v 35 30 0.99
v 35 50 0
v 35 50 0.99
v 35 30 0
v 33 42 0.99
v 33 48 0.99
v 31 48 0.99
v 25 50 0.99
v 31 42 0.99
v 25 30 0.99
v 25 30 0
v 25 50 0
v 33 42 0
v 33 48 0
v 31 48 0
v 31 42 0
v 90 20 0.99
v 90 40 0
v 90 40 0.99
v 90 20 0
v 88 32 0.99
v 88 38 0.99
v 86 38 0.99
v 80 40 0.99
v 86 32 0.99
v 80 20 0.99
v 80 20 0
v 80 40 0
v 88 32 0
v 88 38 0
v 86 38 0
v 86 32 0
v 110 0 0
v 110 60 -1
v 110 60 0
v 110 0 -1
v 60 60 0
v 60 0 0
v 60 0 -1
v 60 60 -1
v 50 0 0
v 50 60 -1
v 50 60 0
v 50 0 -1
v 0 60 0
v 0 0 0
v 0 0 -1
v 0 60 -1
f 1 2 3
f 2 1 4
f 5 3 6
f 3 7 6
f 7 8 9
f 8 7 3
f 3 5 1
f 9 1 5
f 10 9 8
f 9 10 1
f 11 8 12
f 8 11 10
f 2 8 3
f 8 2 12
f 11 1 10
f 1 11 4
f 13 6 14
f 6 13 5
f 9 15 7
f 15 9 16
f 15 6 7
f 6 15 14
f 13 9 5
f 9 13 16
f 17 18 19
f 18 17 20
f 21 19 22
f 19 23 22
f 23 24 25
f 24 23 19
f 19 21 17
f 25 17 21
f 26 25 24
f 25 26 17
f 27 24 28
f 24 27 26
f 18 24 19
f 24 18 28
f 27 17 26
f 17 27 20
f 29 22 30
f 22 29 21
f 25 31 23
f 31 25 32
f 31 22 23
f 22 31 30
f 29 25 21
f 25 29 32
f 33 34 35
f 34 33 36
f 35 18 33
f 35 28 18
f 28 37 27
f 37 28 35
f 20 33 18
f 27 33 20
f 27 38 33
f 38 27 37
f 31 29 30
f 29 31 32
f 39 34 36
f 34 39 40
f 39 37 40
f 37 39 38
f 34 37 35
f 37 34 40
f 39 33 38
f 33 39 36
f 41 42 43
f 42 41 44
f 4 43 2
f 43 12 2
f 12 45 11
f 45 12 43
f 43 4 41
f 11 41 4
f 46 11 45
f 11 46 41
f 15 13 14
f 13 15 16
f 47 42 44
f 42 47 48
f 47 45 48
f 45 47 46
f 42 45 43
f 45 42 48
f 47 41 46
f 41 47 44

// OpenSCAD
// file: ../../Base/PlacementOptions.scad
// Fischertechnik Box Foundation
// Placement Options

// Alignment
NoAlign = 0;
AlignLeft = 1;
AlignBottom = 2;
AlignCenter = 3;
AlignRight = 4;
AlignTop = 5;

// Element rotation degree steps
rotations = [0, -90, -180, -270];

// Rotation
NoRotation = 0;
Rotate0 = 0;
Rotate90 = 1;
Rotate180 = 2;
Rotate270 = 3;

// Docking (seen from above)
NoDock = -1;
DockLeft = 0;
DockTop = 1;
DockRight = 2;
DockCorner = 2;
DockBottom = 3;

// Web corners
LowerLeft = 0;
UpperLeft = 1;
UpperRight = 2;
LowerRight = 3;

// Web position relative to corner
LeftOfCorner = 0;
RightOfCorner = 1;
// file: ../../Base/Boxes.scad
// Fischertechnik Box Foundation
// Pre-designed Boxes

use <Constants.scad>

include <PlacementOptions.scad>

box190Width = 190;
box190Depth = 130;
box130Width = 130;
box130Depth = 95;
boxUsageHeight = 33.9;
boxWallThickness = 2.4;
boxBaseThickness = 1.0;

// getBoxWallThickness()
// Gets the wall thickness of a Fischertechnik Box

function getBoxWallThickness() = boxWallThickness;

// Gets the usable height of a fischertechnik box
function getBoxUsageHeight() = boxUsageHeight;

// Gets the thickness of the Fischertechnik box base.
function getBoxBaseThickness() = boxBaseThickness;

// Gets the usable inner space of a Box 190 as an x/y-list
function getBox190Space() = [
    box190Width - 2*getBoxWallThickness(), 
    box190Depth - 2*getBoxWallThickness() ];

// Imports the Fischertechnik empty box 130x190 mm and places it at position 0,0
// 190x130 are the outer sizes, the inner space is slightly smaller. Use getBox190Space() to get the inner sizes.
// This module needs the STL file "Fischertechnik Box 130x190.stl" in the library path.
// The box is positioned that the usable inner space is at the 0,0,0 position. The

module Box190() {
    translate([-getBoxWallThickness(),-getBoxWallThickness(),-getBoxBaseThickness()])
        import("Fischertechnik Box 130x190.stl", convexity=3);
}

// Gets the usable inner space of a Box 130 as an x/y-list
function getBox130Space() = [
    box130Width - 2*getBoxWallThickness(), 
    box130Depth - 2*getBoxWallThickness() ];

// Imports the Fischertechnik empty box 95x130 mm and places it at position 0,0
// 190x130 are the outer sizes, the inner space is slightly smaller. Use getBox190Space() to get the inner sizes.
// This module needs the STL file "Fischertechnik Box 95x130.stl" in the library path.
// The box is positioned that the usable inner space is at the 0,0,0 position. The

module Box130() {
    translate([-getBoxWallThickness(),-getBoxWallThickness(),-getBoxBaseThickness()])
        import("Fischertechnik Box 95x130.stl", convexity=3);
}

// Creates a web at the specified box walls
// corner 0 = LowerLeft, 1 = UpperLeft, 2 = UpperRight, 3 = LowerRight
// side 0 = LeftOfCorner, 1 = RightOfCorner
// distance = Distance in mm from the corner
// box = inner width and depth of the box (default: Box 190)
// webWidth = length of the web (default is 3 mms)
// webThickness = thickness of the web (default is 1 mm)

module BoxWeb(corner, side, distance, box=getBox190Space(), webWidth=3, webThickness=1.0) {
    sink = getBoxWallThickness()/2;

    width = (corner % 2 == 0) ? 
            (side == LeftOfCorner ? webWidth : webThickness) :
            (side == LeftOfCorner ? webThickness : webWidth);

    depth = (corner % 2 == 0) ? 
            (side == RightOfCorner ? webWidth : webThickness) :
            (side == RightOfCorner ? webThickness : webWidth);
    
    xDiff = corner == LowerLeft ? 
                (side == LeftOfCorner ? -sink : distance) :
            (corner == UpperLeft ?                
                (side == LeftOfCorner ? distance : -sink) :
            (corner == UpperRight ?
                (side == LeftOfCorner ? box.x-webWidth+sink : box.x-distance-webThickness) :
                (side == LeftOfCorner ? box.x-distance-webThickness: box.x-webWidth+sink)));

    yDiff = corner == LowerLeft ? 
                (side == RightOfCorner ? -sink : distance) :
            (corner == UpperLeft ?
                (side == RightOfCorner ? box.y-distance : box.y-webWidth+sink) :
            (corner == UpperRight ?
                (side == RightOfCorner ? box.y-webWidth+sink : box.y-distance) :
                (side == RightOfCorner ? distance : -sink)));
    
    translate([xDiff, yDiff, -getExcess()])
        cube([width, depth, boxUsageHeight + 2*getExcess()]);
}
// file: ../../Base/Rotation.scad
// Fischertechnik Box Foundation
// Geometry Helpers Rotation

include <PlacementOptions.scad>

// getRotatedSpace(space, rotation=NoRotation)
// Rotates the space dependent on the specified rotation

function getRotatedSpace(space, rotation=NoRotation) = [
    (rotation == Rotate90 || rotation == Rotate270) ? space.y : space.x,
    (rotation == Rotate90 || rotation == Rotate270) ? space.x : space.y
];

// Rotates the given space around the fixed left lower corner
// space = the space the children needs as width/depth list [width,depth]
// rotation = 0 Rotate0 degrees, 1 Rotate90 degrees, 2 Rotate180 degrees, 3 Rotate270 degrees (equivalent to -90)

module RotateFix(space, rotation=Rotate0) {
    dy = (rotation == Rotate0 || rotation == Rotate270) ? 0 :
        (rotation == Rotate90) ? space.x :
        space.y;
    dx = (rotation < Rotate180) ? 0 :
        (rotation == Rotate180) ? space.x :
        space.y;
    
    translate([dx, dy, 0])
        rotate([0, 0, rotations[rotation]])
            children();
}
// file: ../../Base/Alignment.scad
// Fischertechnik Box Foundation
// Geometry Helpers Alignment

include <PlacementOptions.scad>

// getAlignedX(elementWidth, spaceWidth, align=AlignRight, offset=0)
// Gets the aligned X offset of an element with the given
// width in the given space.
// elementWidth = The width of the element to positon
// spaceWidth = The space where the element should be aligned
// align = 0 AlignLeft, 1 AlignCenter, 2 AlignRight
// offset = an optional offset from the aligned position. When
// aligned left or centered, then positive values are in X direction.
// When aligned right then positive values are in negative X direction.

function getAlignedX(elementWidth, spaceWidth, align=AlignRight, offset=0) =
    (align == AlignLeft) ?
        offset :
        ((align == AlignCenter) ?
        (spaceWidth - elementWidth)/2 + offset :
        spaceWidth - offset - elementWidth);

// getAlignedY(elementDepth, spaceDepth, align=AlignTop, offset=0)
// Gets the aligned Y offset of an element with the given
// depth in the given space.
// elementDepth = The depth of the element to positon
// spaceDepth = The space where the element should be aligned
// align = 0 AlignBottom, 1 AlignCenter, 2 AlignTop
// offset = an optional offset from the aligned position. When
// aligned bottom or centered, then positive values are in Y direction.
// When aligned top then positive values are in negative Y direction.

function getAlignedY(elementDepth, spaceDepth, align=AlignTop, offset=0) =
    (align == AlignBottom) ?
        offset :
        ((align == AlignCenter) ?
        (spaceDepth - elementDepth)/2 + offset :
        spaceDepth - offset - elementDepth);
// file: ../../Base/Constants.scad
// Fischertechnik Box Foundation
// Constants

// Constant values necessary for multiple elements

// Base constants
dividerThickness = 1.2;
excess = 0.01;
fragments = 90;
tolerance = 0.8;

// Gets the thickness of a divider 
function getDividerThickness() = dividerThickness;

// Gets the excess that is used to merge walls into each other
function getExcess() = excess;

// Gets amount of fragments of a cylinder
function getFragments() = fragments;

// Gets the inner tolerance of a frame to each side
function getTolerance() = tolerance;


// Fischertechnik specific constants
axisDiameter = 4;
axisBottomDiameter = axisDiameter + 1;
standardEdgeDistance = 2.5;
standardWebDistance = 11.5;
standardCornerLength = 15;
tubeWallFactor = 1.6;

// Gets axis diameter
function getAxisDiameter() = axisDiameter;

// Gets axis bottom diameter for thicker part at the bottom
function getAxisBottomDiameter() = axisBottomDiameter;

// gets the standard distance to the wall of the box for dockable frames with webs
function getStandardEdgeDistance() = standardEdgeDistance;

// gets the standard distance of each web to the corner of the dockable frame
function getStandardWebDistance() = standardWebDistance;

// gets the standard length of the corner walls of a dockable frame
function getStandardCornerLength() = standardCornerLength;

// gets the wall thickness of a tube.
function getTubeWallThickness() = tubeWallFactor * getDividerThickness();
// file: ../TestHelper.scad
// Fischertechnik Box Foundation
// Test Helper

function getPlacementBaseSpace() = [50,60];
function getCubeSpace() = [10,20];

module PlacementBase() {
    color("green")
    translate([0, 0, -1])
        cube([getPlacementBaseSpace().x, getPlacementBaseSpace().y, 1]);
}

module Cube() {
    translate([0,0,-.01])
    difference() {
        cube([getCubeSpace().x,getCubeSpace().y,1]);
        translate([getCubeSpace().x*0.6, getCubeSpace().y*0.6, -1])
            cube([getCubeSpace().x*0.2,getCubeSpace().y*0.3,3]);
    }
}

module Deploy(distance=30) {
    for( i = [0:1:$children-1])
        translate([i*distance, 0])
            children(i);
}
// file: ../../Base/Placement.scad
// Fischertechnik Box Foundation
// Geometry Helpers Placement

use <Constants.scad>
use <Alignment.scad>
use <Rotation.scad>
use <Boxes.scad>

include <PlacementOptions.scad>

// Place(x=0, y=0, elementSpace=[0,0], alignX=AlignLeft, alignY=AlignBottom, rotation=Rotate0, boxSpace=getBox190Space())
// Places the child at the specified position
// y = Y-Position. This is a relative position when an X aligment is specified.
// x = X-Position. This is a relative position when an Y aligment is specified.
// elementSpace = space of the element to be placed [x,y]
// alignX = -1=NoAlign, 0 AlignLeft, 1 AlignCenter, 3 AlignRight (elementSpace and boxSpace required!)
// alignY = -1=NoAlign, 2 AlignBottom, 1 AlignCenter, 4 AlignTop (elementSpace and boxSpace required!)
// rotation = 0 Rotate0 0 degrees, 1 Rotate90 90 degrees, 
// 2 Rotate180 180 degrees, 3 Rotate270 270 degrees (equivalent to -90)
// boxSpace = Inner space of the box where the placement occurs [x,y] - default is Box 190x130 inner space

module Place(x=0, y=0, elementSpace=[0,0], 
  alignX=AlignLeft, alignY=AlignBottom, 
  rotation=NoRotation, boxSpace=getBox190Space()) {

    module Position(x, y, space, rotation=Rotate0) {
        translate([x, y, 0])
            RotateFix(space, rotation)
                children(0);
    }

    space = getRotatedSpace(elementSpace, rotation);
    alignedX = getAlignedX(space.x, boxSpace.x, alignX, x);
    alignedY = getAlignedY(space.y, boxSpace.y, alignY, y);
    Position(alignedX, alignedY, elementSpace, rotation)
        children(0);
}

// Center(space=getBox130Space(), elementSpace=[0,0])
// space = Space where the children is centered. For cylinder use centered=true and no elementSpace.
// elementSpace = space of the element to be centered [x,y]

module Center(space=getBox190Space(), elementSpace=[0,0]) {
    translate([(space.x - elementSpace.x) / 2, (space.y - elementSpace.y) / 2])
        children(0);
}

// CenterHorizontal(width=0, y=0, offset=0, space=getBox130Space())
// space = Space where the children is centered. For cylinder use centered=true and no elementSpace.
// elementSpace = space of the element to be centered [x,y]

module CenterHorizontal(width=0, y=0, offset=0, space=getBox190Space()) {
    translate([(space.x - width) / 2 + offset, y])
        children(0);
}

// CenterVertical(depth=0, x=0, offset=0, space=getBox130Space())
// space = Space where the children is centered. For cylinder use centered=true and no elementSpace.
// elementSpace = space of the element to be centered [x,y]

module CenterVerticalal(depth=0, x=0, offset=0, space=getBox190Space()) {
    translate([x, (space.y - depth) / 2 + offset])
        children(0);
}
// main file
// Fischertechnik Box Foundation
// Geometry Helpers Placement
// Test Center

use <../../Base/Placement.scad>

use <../TestHelper.scad>

PlacementBase();

Center(getPlacementBaseSpace())
    Cube();

translate([60, 0]) {
    PlacementBase();
    Center(getPlacementBaseSpace(), getCubeSpace())
        Cube();
}
